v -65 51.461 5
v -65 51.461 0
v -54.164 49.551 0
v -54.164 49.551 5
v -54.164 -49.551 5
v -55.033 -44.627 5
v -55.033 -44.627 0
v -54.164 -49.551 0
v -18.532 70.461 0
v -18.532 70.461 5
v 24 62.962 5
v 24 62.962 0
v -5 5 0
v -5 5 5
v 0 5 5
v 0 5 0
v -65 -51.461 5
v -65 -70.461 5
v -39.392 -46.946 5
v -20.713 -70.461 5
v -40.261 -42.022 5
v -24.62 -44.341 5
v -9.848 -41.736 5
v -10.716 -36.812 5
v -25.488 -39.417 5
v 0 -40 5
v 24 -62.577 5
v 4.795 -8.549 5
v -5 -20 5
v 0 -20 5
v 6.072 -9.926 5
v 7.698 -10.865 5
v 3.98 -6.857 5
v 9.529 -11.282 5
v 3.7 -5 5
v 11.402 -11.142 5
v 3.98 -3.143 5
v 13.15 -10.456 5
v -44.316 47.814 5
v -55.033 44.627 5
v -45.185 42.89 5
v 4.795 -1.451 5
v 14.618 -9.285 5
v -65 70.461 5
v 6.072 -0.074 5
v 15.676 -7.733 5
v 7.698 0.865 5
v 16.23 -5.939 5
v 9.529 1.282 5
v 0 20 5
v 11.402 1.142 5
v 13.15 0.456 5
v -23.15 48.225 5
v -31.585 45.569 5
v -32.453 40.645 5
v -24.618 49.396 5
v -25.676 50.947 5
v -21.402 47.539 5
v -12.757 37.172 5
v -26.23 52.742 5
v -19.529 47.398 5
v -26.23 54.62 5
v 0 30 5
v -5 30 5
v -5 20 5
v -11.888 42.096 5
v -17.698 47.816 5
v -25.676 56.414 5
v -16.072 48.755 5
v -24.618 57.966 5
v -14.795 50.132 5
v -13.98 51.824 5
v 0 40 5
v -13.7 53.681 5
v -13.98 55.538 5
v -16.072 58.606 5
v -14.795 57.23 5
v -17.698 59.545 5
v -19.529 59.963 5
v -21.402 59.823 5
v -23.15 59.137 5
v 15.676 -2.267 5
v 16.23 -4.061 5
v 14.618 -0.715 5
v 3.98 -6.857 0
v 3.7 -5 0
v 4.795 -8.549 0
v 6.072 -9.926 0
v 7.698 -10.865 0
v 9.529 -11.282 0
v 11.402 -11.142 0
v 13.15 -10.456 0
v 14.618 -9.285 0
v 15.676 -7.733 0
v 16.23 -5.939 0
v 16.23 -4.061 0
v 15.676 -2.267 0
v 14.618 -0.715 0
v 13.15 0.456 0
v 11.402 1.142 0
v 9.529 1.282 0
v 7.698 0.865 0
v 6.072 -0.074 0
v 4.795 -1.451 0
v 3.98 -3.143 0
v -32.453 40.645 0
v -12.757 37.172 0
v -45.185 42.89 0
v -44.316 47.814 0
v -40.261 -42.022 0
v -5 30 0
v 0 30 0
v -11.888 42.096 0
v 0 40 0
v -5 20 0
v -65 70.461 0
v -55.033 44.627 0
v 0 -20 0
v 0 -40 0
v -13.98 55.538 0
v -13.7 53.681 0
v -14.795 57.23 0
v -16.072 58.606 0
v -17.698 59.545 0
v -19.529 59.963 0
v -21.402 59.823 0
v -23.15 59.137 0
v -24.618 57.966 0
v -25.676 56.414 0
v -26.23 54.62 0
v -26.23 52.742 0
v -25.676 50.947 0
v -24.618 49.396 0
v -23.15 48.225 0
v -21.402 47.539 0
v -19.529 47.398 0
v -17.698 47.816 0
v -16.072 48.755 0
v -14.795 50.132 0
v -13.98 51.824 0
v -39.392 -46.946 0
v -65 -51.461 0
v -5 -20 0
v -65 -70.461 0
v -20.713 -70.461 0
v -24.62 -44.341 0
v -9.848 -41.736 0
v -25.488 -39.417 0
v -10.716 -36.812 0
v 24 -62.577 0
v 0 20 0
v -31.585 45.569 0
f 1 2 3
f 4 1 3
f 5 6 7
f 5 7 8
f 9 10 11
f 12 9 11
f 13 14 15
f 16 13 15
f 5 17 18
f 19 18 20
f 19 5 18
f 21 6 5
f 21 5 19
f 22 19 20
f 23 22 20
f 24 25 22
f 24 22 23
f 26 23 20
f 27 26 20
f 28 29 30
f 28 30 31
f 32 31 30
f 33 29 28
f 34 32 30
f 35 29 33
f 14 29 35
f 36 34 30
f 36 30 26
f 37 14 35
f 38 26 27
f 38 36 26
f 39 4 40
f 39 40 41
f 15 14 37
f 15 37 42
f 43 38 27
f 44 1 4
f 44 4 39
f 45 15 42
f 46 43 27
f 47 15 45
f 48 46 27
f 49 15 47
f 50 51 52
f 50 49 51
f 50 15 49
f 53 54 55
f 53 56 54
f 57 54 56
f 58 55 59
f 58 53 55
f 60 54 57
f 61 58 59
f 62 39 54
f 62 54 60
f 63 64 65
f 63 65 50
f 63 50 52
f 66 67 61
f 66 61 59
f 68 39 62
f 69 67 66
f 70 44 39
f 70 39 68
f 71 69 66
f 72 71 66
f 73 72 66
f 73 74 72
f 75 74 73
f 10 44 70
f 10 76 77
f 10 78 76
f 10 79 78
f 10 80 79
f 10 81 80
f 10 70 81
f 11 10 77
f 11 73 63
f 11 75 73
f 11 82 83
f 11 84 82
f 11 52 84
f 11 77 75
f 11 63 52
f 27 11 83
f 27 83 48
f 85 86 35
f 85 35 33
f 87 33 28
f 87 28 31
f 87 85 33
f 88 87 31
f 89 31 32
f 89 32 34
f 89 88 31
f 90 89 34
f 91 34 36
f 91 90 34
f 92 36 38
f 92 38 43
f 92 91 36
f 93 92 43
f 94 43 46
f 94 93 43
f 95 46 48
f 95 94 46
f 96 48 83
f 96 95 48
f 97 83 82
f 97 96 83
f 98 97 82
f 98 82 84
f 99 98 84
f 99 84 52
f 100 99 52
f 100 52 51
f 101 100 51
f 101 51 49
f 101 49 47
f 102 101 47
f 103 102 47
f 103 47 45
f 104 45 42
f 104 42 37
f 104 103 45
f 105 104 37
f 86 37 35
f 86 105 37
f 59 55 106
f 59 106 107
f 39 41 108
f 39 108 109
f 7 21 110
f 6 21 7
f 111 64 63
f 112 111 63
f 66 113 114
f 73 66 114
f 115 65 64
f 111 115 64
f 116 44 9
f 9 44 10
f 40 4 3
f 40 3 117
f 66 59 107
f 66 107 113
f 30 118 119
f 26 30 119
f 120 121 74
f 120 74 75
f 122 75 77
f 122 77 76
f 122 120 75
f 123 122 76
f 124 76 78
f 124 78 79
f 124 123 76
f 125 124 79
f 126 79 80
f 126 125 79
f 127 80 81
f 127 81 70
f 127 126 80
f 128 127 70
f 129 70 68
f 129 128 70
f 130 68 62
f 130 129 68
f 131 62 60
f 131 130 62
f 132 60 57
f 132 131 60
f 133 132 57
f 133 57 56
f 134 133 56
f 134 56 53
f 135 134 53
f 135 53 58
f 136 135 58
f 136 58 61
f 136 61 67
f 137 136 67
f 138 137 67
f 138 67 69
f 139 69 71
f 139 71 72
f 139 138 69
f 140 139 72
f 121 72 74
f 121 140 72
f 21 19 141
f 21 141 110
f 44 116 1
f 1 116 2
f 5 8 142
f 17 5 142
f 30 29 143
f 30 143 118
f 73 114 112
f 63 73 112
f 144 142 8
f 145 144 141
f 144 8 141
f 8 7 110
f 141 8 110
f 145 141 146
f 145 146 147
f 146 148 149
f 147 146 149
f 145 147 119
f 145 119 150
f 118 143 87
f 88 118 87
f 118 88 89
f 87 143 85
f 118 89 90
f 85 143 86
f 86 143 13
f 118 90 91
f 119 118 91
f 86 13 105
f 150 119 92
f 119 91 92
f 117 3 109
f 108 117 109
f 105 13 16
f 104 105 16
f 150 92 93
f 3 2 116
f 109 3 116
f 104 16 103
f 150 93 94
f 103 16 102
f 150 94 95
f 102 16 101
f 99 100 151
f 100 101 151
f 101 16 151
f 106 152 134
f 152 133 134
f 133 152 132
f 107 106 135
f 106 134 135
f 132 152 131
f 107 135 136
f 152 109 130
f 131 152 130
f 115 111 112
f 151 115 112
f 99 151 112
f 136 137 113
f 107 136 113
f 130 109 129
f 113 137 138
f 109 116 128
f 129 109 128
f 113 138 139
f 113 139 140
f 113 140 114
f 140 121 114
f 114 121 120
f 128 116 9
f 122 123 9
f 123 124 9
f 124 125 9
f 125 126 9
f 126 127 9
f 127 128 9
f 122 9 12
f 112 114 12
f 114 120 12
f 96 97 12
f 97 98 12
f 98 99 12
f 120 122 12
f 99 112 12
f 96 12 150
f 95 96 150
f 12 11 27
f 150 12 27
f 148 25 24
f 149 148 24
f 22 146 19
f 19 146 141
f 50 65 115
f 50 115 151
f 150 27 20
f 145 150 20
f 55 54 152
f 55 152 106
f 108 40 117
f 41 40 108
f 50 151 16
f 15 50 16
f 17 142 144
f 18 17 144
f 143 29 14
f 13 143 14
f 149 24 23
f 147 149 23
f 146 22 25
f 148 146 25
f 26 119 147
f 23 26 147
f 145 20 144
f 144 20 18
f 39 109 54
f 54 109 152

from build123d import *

# Parameters (mm, degrees)
ESQUISSE1_R             = 6.3
BOSS_EXTRU_1_DEPTH      = 5
ESQUISSE4_W             = 5
ESQUISSE4_H             = 25
ESQUISSE4_H_2           = 10
BOSS_EXTRU_2_DEPTH      = 5
ENL_V_MAT_EXTRU_1_DEPTH = 5


with BuildPart() as part:
    # Esquisse1 → Boss.-Extru.1 (new body)
    with BuildSketch(Plane.XY):
        Polygon((-65, 51.461253746), (0, 40), (0, -40), (-65, -51.461253746), (-65, -71.461253746), (-20.625899742, -71.461253746), (25, -63.416176602), (25, 63.800831685), (-18.444412366, 71.461253746), (-65, 71.461253746), align=None)
        with Locations((-20, 53.680805733)):
            Circle(ESQUISSE1_R, mode=Mode.SUBTRACT)
        with Locations(Location((10, -5, 0), (0, 0, 180))):
            Circle(ESQUISSE1_R, mode=Mode.SUBTRACT)
    extrude(amount=BOSS_EXTRU_1_DEPTH)

    # Esquisse4 → Boss.-Extru.2 (add)
    with BuildSketch(Plane.XY.offset(5)):
        with Locations((-2.5, -7.5)):
            Rectangle(ESQUISSE4_W, ESQUISSE4_H)
        Polygon((-11.888404247, 42.096246426), (-31.584559307, 45.56920998), (-32.452800195, 40.645171215), (-12.756645135, 37.172207661), align=None)
        Polygon((-9.84807753, -41.736481777), (-24.620193825, -44.341204442), (-25.488434714, -39.417165677), (-10.716318418, -36.812443012), align=None)
        with Locations((-2.5, 25)):
            Rectangle(ESQUISSE4_W, ESQUISSE4_H_2)
        Polygon((-54.164426416, -49.550649772), (-39.39231012, -46.945927107), (-40.260551009, -42.021888342), (-55.032667304, -44.626611007), align=None)
        Polygon((-44.316348886, 47.814167995), (-54.164426416, 49.550649772), (-55.032667304, 44.626611007), (-45.184589774, 42.89012923), align=None)
    extrude(amount=-BOSS_EXTRU_2_DEPTH)

    # Esquisse5 → Enlèv. mat.-Extru.1 (cut)
    with BuildSketch(Plane.XY.offset(5)):
        Polygon((-65, 70.461253746), (-18.53190103, 70.461253746), (24, 62.961732054), (24, -62.577076971), (-20.713388405, -70.461253746), (-65, -70.461253746), (-65, -77.148207451), (34.423224657, -77.148207451), (34.423224657, 88.893594993), (-65, 88.893594993), align=None)
    extrude(amount=-ENL_V_MAT_EXTRU_1_DEPTH, mode=Mode.SUBTRACT)


solid = part.part
